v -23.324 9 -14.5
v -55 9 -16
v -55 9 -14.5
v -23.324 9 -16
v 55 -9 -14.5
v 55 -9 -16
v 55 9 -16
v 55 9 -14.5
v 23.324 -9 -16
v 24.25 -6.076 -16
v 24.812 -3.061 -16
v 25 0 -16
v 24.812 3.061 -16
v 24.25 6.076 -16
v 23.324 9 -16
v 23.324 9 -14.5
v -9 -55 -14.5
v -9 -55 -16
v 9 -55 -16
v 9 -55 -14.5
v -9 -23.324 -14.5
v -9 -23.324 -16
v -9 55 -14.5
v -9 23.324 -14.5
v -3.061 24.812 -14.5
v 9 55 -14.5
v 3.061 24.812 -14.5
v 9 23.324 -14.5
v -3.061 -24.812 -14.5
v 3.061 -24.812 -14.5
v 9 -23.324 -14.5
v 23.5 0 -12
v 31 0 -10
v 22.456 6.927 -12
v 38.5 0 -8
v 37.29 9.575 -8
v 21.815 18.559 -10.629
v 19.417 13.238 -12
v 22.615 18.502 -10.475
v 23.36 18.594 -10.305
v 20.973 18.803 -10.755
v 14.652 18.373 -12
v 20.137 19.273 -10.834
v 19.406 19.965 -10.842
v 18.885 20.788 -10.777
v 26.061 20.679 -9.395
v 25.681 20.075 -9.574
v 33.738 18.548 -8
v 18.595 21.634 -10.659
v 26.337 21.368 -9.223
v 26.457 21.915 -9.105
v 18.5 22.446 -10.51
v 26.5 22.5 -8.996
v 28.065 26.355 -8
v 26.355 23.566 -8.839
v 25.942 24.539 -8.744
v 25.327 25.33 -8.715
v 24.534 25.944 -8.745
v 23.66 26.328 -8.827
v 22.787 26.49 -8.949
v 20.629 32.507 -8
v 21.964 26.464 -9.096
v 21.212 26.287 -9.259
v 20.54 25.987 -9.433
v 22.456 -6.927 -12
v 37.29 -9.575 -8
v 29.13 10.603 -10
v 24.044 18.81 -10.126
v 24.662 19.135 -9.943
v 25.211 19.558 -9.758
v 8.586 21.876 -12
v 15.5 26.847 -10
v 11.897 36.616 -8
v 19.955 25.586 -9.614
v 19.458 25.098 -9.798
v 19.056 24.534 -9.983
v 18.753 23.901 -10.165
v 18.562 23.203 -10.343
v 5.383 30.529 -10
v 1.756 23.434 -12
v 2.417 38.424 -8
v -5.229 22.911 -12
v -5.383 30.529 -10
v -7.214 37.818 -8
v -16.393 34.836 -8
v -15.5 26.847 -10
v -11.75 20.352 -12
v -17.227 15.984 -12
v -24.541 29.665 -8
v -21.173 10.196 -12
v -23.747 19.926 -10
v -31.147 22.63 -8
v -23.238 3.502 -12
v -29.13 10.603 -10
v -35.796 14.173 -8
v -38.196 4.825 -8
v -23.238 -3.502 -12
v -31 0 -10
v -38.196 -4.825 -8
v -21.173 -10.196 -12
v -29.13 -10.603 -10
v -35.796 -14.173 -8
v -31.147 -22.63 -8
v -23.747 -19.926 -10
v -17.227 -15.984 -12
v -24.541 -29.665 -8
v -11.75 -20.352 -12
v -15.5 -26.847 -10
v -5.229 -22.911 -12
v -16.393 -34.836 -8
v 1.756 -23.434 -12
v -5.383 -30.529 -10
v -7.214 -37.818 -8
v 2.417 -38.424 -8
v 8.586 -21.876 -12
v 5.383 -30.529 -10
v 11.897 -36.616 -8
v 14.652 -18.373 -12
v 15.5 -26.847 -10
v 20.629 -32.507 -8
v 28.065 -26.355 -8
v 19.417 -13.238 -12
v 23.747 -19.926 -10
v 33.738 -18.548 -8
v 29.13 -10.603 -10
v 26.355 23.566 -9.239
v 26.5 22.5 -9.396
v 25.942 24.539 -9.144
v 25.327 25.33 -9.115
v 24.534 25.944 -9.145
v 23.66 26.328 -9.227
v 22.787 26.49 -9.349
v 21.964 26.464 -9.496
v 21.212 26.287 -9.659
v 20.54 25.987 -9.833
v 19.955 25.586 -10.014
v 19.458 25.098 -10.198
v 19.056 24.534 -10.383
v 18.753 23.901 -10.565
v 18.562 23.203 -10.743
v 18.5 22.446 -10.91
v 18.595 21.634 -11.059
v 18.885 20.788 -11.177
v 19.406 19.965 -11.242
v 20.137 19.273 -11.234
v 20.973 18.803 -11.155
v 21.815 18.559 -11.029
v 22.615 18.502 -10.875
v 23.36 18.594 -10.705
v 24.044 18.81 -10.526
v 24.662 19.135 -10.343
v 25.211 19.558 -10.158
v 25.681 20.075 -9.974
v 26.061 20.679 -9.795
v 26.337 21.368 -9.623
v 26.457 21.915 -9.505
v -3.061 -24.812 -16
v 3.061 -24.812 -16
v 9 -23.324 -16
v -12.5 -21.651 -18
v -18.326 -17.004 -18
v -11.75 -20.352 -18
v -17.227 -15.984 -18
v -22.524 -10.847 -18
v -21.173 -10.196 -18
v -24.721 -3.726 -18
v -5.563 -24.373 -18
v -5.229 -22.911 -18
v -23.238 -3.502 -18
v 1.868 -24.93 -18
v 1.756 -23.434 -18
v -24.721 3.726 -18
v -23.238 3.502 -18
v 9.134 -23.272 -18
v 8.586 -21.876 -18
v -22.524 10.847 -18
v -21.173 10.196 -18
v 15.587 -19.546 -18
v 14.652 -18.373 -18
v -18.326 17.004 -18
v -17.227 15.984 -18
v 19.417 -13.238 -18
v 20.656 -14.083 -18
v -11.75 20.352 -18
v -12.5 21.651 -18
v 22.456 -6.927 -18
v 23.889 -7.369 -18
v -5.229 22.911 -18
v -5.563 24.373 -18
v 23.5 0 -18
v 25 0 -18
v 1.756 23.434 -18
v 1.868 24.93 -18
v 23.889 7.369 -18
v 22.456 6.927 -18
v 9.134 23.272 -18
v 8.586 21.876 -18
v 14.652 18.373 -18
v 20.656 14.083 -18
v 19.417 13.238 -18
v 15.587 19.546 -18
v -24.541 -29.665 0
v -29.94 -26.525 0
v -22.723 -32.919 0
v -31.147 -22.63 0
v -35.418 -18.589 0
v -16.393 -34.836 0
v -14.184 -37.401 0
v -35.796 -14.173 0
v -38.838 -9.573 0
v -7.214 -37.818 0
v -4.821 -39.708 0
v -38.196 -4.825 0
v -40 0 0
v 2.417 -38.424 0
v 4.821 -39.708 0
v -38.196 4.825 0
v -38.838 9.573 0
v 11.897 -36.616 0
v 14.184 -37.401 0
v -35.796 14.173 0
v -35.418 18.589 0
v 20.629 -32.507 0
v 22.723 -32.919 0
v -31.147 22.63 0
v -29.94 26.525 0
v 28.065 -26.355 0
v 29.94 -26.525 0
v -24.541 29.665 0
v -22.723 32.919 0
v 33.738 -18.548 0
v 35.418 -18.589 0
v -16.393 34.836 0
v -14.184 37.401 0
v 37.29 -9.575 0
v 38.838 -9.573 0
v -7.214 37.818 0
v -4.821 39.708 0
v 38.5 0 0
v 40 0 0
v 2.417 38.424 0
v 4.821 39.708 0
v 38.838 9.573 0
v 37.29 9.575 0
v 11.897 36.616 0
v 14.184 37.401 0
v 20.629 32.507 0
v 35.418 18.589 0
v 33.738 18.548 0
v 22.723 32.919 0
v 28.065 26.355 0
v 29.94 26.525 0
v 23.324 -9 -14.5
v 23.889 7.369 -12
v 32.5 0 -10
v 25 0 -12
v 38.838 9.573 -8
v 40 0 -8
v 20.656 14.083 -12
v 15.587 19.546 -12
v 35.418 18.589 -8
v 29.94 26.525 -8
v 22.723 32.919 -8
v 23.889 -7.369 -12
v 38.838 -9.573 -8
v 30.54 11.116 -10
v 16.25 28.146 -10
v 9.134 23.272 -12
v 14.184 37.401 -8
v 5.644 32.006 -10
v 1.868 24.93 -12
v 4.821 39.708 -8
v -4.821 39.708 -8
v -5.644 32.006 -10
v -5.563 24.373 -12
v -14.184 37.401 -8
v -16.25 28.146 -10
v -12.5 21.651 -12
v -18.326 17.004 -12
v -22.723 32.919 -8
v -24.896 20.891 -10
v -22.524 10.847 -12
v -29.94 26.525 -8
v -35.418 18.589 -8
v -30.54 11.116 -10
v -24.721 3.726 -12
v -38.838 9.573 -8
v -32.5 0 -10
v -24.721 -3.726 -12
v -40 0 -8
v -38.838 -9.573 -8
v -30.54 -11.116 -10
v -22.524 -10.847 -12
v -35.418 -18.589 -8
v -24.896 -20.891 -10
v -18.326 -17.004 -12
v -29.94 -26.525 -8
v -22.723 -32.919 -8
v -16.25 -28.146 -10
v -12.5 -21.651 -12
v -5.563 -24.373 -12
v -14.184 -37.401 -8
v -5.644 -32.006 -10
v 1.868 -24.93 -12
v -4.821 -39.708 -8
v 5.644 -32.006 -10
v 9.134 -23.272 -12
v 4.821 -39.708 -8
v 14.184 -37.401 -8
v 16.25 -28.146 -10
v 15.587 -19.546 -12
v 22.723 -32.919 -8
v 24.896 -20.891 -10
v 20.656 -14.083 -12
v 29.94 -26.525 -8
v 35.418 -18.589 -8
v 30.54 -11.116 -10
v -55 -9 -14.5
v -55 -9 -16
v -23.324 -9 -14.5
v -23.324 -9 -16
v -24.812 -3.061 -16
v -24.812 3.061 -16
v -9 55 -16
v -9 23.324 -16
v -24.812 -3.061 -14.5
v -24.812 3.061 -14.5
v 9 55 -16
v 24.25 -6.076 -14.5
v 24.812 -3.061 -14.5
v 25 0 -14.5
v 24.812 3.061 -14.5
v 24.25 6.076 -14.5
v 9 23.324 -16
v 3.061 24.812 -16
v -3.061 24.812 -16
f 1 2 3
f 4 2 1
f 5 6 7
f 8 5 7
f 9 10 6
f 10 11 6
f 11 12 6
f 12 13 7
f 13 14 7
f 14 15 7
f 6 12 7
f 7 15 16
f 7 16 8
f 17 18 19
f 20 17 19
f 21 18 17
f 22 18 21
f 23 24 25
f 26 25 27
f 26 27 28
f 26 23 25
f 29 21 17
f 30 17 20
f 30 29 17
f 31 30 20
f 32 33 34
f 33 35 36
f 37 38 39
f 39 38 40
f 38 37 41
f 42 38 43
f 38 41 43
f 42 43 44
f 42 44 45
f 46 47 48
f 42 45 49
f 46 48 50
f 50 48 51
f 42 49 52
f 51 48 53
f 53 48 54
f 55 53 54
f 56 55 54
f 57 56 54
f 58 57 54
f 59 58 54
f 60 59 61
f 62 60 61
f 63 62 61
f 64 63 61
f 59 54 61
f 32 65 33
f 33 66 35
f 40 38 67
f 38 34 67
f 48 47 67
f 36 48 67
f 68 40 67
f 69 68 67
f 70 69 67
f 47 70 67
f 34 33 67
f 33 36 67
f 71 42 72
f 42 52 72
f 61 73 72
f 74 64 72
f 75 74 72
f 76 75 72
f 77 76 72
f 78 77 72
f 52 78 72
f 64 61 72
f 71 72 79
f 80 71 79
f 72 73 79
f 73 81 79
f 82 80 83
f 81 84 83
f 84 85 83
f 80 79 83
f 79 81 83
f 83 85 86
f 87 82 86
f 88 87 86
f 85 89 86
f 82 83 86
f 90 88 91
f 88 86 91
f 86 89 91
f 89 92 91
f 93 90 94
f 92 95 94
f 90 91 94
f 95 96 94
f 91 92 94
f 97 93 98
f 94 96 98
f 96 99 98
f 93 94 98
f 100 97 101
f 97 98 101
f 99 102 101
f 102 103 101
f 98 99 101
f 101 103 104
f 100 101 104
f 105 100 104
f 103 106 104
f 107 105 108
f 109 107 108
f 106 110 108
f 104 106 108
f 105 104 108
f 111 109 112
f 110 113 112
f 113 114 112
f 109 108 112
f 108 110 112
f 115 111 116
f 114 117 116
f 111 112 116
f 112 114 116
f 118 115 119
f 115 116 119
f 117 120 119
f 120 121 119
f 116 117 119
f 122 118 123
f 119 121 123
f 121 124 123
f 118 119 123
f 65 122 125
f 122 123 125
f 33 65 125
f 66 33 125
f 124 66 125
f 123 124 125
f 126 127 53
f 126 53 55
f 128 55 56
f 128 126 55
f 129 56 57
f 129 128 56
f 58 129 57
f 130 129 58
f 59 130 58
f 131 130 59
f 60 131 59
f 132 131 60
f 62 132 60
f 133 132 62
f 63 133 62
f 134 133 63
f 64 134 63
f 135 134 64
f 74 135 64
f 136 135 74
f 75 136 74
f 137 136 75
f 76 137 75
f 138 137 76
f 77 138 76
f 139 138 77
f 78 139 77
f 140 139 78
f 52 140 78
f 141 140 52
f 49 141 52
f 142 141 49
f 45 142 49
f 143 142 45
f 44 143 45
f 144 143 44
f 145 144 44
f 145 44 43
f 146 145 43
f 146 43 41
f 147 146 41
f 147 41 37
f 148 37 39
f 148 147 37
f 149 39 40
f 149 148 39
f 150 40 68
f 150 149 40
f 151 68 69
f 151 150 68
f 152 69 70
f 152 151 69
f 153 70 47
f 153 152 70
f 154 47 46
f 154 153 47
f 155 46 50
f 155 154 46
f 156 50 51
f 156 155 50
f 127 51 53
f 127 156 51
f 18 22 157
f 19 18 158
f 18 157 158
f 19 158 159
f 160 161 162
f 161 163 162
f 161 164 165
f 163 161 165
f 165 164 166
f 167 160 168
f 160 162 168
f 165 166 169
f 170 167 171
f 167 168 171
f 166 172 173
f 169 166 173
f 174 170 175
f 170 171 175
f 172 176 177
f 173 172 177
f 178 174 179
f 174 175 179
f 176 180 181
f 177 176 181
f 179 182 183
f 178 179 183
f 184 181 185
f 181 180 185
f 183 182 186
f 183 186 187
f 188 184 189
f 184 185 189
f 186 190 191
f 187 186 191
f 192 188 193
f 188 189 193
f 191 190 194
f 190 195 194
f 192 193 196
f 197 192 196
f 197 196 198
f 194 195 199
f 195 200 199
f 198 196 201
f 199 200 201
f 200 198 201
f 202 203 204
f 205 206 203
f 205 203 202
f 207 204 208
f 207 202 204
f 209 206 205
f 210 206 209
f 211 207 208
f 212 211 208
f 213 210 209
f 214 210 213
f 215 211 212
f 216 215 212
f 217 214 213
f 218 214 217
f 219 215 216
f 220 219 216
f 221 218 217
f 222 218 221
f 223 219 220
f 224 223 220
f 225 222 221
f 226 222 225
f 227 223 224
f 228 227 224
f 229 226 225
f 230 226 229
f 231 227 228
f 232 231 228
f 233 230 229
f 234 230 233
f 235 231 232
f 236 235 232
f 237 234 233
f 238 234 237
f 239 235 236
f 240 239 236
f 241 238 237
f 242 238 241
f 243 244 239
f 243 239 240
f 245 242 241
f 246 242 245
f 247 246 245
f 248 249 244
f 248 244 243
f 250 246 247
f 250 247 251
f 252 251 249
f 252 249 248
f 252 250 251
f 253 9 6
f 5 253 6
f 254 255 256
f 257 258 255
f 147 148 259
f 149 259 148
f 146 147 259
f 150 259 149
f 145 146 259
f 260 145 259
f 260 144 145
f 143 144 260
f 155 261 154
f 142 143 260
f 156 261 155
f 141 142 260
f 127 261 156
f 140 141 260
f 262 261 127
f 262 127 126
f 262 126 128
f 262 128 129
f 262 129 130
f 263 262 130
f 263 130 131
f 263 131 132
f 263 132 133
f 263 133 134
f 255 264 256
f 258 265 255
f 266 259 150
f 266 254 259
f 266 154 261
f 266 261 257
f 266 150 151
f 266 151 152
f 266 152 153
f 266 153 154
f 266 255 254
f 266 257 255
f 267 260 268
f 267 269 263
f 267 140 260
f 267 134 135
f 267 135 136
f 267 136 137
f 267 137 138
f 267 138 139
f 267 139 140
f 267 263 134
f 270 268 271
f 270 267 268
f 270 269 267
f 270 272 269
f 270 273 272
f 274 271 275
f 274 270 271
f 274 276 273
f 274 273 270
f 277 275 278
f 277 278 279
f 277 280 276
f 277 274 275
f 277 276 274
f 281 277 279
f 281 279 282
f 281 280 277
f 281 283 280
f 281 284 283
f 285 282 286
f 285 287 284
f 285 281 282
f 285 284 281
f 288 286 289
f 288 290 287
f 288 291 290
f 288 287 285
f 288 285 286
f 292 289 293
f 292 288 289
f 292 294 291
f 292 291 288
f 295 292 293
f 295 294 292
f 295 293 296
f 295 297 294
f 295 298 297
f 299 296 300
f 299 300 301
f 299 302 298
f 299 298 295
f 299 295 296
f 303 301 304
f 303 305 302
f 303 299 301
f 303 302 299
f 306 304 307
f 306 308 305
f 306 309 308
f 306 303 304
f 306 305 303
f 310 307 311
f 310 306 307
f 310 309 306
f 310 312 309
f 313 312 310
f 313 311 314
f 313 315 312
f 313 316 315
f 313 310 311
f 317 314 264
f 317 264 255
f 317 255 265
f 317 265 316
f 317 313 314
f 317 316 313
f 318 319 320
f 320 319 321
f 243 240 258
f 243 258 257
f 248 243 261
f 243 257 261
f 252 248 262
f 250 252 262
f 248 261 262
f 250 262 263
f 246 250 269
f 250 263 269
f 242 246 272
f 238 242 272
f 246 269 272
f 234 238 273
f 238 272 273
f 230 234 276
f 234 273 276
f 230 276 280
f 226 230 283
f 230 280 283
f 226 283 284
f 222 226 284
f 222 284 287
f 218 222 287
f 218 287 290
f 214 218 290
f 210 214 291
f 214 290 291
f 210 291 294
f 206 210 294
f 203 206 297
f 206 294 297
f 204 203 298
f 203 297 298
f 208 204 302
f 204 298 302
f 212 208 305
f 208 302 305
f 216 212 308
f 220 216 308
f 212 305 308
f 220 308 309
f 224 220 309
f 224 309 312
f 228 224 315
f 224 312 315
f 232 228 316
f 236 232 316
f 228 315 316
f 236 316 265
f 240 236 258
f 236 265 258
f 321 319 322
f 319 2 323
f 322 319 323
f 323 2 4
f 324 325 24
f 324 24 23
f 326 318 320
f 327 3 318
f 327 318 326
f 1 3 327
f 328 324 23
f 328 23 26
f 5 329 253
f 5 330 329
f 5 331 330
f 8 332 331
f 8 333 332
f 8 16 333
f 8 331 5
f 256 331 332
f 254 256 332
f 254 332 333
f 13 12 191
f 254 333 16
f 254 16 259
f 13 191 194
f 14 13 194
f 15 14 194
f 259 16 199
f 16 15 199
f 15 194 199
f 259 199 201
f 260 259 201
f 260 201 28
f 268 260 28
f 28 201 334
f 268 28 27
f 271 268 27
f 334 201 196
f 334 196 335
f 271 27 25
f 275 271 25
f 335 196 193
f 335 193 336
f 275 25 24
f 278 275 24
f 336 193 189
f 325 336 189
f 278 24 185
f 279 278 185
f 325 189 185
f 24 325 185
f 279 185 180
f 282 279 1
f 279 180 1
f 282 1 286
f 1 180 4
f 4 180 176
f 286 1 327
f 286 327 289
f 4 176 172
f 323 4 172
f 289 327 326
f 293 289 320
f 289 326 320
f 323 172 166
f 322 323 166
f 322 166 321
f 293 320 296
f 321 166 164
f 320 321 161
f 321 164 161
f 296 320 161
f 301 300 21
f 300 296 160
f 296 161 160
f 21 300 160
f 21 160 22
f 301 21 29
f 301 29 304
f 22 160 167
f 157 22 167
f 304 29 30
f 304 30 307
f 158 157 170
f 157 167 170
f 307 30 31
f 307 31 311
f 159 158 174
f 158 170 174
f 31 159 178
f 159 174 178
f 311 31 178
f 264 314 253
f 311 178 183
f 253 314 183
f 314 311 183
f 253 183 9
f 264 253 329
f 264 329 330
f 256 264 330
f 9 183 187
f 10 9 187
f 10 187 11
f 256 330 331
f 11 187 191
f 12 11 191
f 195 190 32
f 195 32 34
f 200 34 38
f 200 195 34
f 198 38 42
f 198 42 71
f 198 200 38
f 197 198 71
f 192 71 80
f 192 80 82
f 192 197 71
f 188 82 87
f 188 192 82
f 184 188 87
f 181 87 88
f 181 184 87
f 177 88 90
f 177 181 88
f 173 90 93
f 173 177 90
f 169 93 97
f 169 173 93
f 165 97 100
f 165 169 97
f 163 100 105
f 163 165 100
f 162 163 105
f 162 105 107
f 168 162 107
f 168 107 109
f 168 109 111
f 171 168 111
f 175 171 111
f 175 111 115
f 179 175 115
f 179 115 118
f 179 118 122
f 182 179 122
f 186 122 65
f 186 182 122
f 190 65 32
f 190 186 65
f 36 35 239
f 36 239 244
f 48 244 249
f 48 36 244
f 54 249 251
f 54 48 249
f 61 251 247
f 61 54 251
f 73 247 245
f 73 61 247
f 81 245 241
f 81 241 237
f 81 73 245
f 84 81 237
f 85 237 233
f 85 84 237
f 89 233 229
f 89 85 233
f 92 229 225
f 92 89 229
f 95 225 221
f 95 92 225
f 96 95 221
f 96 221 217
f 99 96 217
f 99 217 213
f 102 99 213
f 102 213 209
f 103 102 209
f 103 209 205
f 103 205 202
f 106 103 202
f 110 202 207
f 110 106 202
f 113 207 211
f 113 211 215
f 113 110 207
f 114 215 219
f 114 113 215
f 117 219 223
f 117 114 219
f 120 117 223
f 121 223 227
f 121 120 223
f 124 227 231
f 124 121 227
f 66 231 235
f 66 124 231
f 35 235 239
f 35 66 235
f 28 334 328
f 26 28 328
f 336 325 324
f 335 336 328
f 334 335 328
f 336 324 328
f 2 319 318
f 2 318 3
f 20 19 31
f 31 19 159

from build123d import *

# Parameters (mm, degrees)
CYLINDER004_R     = 23.5
CYLINDER004_DEPTH = 6
CYLINDER003_R     = 25
CYLINDER003_DEPTH = 6
CYLINDER_R        = 4
CYLINDER_DEPTH    = 10
CYLINDER005_R     = 25
CYLINDER005_DEPTH = 6
BOX_W             = 110
BOX_H             = 18
BOX_DEPTH         = 1.5
BOX001_W          = 18
BOX001_H          = 110
BOX001_DEPTH      = 1.5
CYLINDER002_R     = 38.5
CYLINDER002_DEPTH = 8
CYLINDER001_R     = 40
CYLINDER001_DEPTH = 8


with BuildPart() as cilindro004:
    # Cylinder004 → Cylinder004 (new body)
    with BuildSketch(Plane.XY.offset(-18)):
        Circle(CYLINDER004_R)
    extrude(amount=CYLINDER004_DEPTH)


with BuildPart() as cut002:
    # Cylinder003 → Cylinder003 (new body)
    with BuildSketch(Plane.XY.offset(-18)):
        Circle(CYLINDER003_R)
    extrude(amount=CYLINDER003_DEPTH)

    # Cut002: cut Cilindro004
    add(cilindro004.part, mode=Mode.SUBTRACT)


with BuildPart() as cilindro:
    # Cylinder → Cylinder (new body)
    with BuildSketch(Plane(origin=(22.5, 22.5, -14), x_dir=(1, 0, 0), z_dir=(0, 0, 1))):
        Circle(CYLINDER_R)
    extrude(amount=CYLINDER_DEPTH)


with BuildPart() as cono001:
    # Cone001 → Cone001 (revolve)
    with BuildSketch(Plane(origin=(0, 0, -12), x_dir=(1, 0, 0), z_dir=(0, -1, 0))):
        Polygon((0, 0), (23.5, 0), (38.5, 4), (0, 4), align=None)
    revolve(axis=Axis((0, 0, -12), (0, 0, 1)))


with BuildPart() as cut004:
    # Cone → Cone (revolve)
    with BuildSketch(Plane(origin=(0, 0, -12), x_dir=(1, 0, 0), z_dir=(0, -1, 0))):
        Polygon((0, 0), (25, 0), (40, 4), (0, 4), align=None)
    revolve(axis=Axis((0, 0, -12), (0, 0, 1)))

    # Cut001: cut Cono001
    add(cono001.part, mode=Mode.SUBTRACT)

    # Cut004: cut Cilindro
    add(cilindro.part, mode=Mode.SUBTRACT)


with BuildPart() as cilindro005:
    # Cylinder005 → Cylinder005 (new body)
    with BuildSketch(Plane.XY.offset(-18)):
        Circle(CYLINDER005_R)
    extrude(amount=CYLINDER005_DEPTH)


with BuildPart() as cubo:
    # Box → Box (new body)
    with BuildSketch(Plane(origin=(-55, -9, 0), x_dir=(1, 0, 0), z_dir=(0, 0, 1))):
        with Locations((55, 9)):
            Rectangle(BOX_W, BOX_H)
    extrude(amount=BOX_DEPTH)


with BuildPart() as cut005:
    # Box001 → Box001 (new body)
    with BuildSketch(Plane(origin=(-9, -55, 0), x_dir=(1, 0, 0), z_dir=(0, 0, 1))):
        with Locations((9, 55)):
            Rectangle(BOX001_W, BOX001_H)
    extrude(amount=BOX001_DEPTH)

    # Fusion: union Cubo
    add(cubo.part)


with BuildPart() as cut005_1:
    # Fusion placement: moved
    add(cut005.part.moved(Location((0, 0, -16))))

    # Cut005: cut Cilindro005
    add(cilindro005.part, mode=Mode.SUBTRACT)


with BuildPart() as cilindro002:
    # Cylinder002 → Cylinder002 (new body)
    with BuildSketch(Plane.XY.offset(-8)):
        Circle(CYLINDER002_R)
    extrude(amount=CYLINDER002_DEPTH)


with BuildPart() as fusion001:
    # Cylinder001 → Cylinder001 (new body)
    with BuildSketch(Plane.XY.offset(-8)):
        Circle(CYLINDER001_R)
    extrude(amount=CYLINDER001_DEPTH)

    # Cut: cut Cilindro002
    add(cilindro002.part, mode=Mode.SUBTRACT)

    # Fusion001: union Cut002, Cut004, Cut005
    add(cut002.part)
    add(cut004.part)
    add(cut005_1.part)


solid = fusion001.part
